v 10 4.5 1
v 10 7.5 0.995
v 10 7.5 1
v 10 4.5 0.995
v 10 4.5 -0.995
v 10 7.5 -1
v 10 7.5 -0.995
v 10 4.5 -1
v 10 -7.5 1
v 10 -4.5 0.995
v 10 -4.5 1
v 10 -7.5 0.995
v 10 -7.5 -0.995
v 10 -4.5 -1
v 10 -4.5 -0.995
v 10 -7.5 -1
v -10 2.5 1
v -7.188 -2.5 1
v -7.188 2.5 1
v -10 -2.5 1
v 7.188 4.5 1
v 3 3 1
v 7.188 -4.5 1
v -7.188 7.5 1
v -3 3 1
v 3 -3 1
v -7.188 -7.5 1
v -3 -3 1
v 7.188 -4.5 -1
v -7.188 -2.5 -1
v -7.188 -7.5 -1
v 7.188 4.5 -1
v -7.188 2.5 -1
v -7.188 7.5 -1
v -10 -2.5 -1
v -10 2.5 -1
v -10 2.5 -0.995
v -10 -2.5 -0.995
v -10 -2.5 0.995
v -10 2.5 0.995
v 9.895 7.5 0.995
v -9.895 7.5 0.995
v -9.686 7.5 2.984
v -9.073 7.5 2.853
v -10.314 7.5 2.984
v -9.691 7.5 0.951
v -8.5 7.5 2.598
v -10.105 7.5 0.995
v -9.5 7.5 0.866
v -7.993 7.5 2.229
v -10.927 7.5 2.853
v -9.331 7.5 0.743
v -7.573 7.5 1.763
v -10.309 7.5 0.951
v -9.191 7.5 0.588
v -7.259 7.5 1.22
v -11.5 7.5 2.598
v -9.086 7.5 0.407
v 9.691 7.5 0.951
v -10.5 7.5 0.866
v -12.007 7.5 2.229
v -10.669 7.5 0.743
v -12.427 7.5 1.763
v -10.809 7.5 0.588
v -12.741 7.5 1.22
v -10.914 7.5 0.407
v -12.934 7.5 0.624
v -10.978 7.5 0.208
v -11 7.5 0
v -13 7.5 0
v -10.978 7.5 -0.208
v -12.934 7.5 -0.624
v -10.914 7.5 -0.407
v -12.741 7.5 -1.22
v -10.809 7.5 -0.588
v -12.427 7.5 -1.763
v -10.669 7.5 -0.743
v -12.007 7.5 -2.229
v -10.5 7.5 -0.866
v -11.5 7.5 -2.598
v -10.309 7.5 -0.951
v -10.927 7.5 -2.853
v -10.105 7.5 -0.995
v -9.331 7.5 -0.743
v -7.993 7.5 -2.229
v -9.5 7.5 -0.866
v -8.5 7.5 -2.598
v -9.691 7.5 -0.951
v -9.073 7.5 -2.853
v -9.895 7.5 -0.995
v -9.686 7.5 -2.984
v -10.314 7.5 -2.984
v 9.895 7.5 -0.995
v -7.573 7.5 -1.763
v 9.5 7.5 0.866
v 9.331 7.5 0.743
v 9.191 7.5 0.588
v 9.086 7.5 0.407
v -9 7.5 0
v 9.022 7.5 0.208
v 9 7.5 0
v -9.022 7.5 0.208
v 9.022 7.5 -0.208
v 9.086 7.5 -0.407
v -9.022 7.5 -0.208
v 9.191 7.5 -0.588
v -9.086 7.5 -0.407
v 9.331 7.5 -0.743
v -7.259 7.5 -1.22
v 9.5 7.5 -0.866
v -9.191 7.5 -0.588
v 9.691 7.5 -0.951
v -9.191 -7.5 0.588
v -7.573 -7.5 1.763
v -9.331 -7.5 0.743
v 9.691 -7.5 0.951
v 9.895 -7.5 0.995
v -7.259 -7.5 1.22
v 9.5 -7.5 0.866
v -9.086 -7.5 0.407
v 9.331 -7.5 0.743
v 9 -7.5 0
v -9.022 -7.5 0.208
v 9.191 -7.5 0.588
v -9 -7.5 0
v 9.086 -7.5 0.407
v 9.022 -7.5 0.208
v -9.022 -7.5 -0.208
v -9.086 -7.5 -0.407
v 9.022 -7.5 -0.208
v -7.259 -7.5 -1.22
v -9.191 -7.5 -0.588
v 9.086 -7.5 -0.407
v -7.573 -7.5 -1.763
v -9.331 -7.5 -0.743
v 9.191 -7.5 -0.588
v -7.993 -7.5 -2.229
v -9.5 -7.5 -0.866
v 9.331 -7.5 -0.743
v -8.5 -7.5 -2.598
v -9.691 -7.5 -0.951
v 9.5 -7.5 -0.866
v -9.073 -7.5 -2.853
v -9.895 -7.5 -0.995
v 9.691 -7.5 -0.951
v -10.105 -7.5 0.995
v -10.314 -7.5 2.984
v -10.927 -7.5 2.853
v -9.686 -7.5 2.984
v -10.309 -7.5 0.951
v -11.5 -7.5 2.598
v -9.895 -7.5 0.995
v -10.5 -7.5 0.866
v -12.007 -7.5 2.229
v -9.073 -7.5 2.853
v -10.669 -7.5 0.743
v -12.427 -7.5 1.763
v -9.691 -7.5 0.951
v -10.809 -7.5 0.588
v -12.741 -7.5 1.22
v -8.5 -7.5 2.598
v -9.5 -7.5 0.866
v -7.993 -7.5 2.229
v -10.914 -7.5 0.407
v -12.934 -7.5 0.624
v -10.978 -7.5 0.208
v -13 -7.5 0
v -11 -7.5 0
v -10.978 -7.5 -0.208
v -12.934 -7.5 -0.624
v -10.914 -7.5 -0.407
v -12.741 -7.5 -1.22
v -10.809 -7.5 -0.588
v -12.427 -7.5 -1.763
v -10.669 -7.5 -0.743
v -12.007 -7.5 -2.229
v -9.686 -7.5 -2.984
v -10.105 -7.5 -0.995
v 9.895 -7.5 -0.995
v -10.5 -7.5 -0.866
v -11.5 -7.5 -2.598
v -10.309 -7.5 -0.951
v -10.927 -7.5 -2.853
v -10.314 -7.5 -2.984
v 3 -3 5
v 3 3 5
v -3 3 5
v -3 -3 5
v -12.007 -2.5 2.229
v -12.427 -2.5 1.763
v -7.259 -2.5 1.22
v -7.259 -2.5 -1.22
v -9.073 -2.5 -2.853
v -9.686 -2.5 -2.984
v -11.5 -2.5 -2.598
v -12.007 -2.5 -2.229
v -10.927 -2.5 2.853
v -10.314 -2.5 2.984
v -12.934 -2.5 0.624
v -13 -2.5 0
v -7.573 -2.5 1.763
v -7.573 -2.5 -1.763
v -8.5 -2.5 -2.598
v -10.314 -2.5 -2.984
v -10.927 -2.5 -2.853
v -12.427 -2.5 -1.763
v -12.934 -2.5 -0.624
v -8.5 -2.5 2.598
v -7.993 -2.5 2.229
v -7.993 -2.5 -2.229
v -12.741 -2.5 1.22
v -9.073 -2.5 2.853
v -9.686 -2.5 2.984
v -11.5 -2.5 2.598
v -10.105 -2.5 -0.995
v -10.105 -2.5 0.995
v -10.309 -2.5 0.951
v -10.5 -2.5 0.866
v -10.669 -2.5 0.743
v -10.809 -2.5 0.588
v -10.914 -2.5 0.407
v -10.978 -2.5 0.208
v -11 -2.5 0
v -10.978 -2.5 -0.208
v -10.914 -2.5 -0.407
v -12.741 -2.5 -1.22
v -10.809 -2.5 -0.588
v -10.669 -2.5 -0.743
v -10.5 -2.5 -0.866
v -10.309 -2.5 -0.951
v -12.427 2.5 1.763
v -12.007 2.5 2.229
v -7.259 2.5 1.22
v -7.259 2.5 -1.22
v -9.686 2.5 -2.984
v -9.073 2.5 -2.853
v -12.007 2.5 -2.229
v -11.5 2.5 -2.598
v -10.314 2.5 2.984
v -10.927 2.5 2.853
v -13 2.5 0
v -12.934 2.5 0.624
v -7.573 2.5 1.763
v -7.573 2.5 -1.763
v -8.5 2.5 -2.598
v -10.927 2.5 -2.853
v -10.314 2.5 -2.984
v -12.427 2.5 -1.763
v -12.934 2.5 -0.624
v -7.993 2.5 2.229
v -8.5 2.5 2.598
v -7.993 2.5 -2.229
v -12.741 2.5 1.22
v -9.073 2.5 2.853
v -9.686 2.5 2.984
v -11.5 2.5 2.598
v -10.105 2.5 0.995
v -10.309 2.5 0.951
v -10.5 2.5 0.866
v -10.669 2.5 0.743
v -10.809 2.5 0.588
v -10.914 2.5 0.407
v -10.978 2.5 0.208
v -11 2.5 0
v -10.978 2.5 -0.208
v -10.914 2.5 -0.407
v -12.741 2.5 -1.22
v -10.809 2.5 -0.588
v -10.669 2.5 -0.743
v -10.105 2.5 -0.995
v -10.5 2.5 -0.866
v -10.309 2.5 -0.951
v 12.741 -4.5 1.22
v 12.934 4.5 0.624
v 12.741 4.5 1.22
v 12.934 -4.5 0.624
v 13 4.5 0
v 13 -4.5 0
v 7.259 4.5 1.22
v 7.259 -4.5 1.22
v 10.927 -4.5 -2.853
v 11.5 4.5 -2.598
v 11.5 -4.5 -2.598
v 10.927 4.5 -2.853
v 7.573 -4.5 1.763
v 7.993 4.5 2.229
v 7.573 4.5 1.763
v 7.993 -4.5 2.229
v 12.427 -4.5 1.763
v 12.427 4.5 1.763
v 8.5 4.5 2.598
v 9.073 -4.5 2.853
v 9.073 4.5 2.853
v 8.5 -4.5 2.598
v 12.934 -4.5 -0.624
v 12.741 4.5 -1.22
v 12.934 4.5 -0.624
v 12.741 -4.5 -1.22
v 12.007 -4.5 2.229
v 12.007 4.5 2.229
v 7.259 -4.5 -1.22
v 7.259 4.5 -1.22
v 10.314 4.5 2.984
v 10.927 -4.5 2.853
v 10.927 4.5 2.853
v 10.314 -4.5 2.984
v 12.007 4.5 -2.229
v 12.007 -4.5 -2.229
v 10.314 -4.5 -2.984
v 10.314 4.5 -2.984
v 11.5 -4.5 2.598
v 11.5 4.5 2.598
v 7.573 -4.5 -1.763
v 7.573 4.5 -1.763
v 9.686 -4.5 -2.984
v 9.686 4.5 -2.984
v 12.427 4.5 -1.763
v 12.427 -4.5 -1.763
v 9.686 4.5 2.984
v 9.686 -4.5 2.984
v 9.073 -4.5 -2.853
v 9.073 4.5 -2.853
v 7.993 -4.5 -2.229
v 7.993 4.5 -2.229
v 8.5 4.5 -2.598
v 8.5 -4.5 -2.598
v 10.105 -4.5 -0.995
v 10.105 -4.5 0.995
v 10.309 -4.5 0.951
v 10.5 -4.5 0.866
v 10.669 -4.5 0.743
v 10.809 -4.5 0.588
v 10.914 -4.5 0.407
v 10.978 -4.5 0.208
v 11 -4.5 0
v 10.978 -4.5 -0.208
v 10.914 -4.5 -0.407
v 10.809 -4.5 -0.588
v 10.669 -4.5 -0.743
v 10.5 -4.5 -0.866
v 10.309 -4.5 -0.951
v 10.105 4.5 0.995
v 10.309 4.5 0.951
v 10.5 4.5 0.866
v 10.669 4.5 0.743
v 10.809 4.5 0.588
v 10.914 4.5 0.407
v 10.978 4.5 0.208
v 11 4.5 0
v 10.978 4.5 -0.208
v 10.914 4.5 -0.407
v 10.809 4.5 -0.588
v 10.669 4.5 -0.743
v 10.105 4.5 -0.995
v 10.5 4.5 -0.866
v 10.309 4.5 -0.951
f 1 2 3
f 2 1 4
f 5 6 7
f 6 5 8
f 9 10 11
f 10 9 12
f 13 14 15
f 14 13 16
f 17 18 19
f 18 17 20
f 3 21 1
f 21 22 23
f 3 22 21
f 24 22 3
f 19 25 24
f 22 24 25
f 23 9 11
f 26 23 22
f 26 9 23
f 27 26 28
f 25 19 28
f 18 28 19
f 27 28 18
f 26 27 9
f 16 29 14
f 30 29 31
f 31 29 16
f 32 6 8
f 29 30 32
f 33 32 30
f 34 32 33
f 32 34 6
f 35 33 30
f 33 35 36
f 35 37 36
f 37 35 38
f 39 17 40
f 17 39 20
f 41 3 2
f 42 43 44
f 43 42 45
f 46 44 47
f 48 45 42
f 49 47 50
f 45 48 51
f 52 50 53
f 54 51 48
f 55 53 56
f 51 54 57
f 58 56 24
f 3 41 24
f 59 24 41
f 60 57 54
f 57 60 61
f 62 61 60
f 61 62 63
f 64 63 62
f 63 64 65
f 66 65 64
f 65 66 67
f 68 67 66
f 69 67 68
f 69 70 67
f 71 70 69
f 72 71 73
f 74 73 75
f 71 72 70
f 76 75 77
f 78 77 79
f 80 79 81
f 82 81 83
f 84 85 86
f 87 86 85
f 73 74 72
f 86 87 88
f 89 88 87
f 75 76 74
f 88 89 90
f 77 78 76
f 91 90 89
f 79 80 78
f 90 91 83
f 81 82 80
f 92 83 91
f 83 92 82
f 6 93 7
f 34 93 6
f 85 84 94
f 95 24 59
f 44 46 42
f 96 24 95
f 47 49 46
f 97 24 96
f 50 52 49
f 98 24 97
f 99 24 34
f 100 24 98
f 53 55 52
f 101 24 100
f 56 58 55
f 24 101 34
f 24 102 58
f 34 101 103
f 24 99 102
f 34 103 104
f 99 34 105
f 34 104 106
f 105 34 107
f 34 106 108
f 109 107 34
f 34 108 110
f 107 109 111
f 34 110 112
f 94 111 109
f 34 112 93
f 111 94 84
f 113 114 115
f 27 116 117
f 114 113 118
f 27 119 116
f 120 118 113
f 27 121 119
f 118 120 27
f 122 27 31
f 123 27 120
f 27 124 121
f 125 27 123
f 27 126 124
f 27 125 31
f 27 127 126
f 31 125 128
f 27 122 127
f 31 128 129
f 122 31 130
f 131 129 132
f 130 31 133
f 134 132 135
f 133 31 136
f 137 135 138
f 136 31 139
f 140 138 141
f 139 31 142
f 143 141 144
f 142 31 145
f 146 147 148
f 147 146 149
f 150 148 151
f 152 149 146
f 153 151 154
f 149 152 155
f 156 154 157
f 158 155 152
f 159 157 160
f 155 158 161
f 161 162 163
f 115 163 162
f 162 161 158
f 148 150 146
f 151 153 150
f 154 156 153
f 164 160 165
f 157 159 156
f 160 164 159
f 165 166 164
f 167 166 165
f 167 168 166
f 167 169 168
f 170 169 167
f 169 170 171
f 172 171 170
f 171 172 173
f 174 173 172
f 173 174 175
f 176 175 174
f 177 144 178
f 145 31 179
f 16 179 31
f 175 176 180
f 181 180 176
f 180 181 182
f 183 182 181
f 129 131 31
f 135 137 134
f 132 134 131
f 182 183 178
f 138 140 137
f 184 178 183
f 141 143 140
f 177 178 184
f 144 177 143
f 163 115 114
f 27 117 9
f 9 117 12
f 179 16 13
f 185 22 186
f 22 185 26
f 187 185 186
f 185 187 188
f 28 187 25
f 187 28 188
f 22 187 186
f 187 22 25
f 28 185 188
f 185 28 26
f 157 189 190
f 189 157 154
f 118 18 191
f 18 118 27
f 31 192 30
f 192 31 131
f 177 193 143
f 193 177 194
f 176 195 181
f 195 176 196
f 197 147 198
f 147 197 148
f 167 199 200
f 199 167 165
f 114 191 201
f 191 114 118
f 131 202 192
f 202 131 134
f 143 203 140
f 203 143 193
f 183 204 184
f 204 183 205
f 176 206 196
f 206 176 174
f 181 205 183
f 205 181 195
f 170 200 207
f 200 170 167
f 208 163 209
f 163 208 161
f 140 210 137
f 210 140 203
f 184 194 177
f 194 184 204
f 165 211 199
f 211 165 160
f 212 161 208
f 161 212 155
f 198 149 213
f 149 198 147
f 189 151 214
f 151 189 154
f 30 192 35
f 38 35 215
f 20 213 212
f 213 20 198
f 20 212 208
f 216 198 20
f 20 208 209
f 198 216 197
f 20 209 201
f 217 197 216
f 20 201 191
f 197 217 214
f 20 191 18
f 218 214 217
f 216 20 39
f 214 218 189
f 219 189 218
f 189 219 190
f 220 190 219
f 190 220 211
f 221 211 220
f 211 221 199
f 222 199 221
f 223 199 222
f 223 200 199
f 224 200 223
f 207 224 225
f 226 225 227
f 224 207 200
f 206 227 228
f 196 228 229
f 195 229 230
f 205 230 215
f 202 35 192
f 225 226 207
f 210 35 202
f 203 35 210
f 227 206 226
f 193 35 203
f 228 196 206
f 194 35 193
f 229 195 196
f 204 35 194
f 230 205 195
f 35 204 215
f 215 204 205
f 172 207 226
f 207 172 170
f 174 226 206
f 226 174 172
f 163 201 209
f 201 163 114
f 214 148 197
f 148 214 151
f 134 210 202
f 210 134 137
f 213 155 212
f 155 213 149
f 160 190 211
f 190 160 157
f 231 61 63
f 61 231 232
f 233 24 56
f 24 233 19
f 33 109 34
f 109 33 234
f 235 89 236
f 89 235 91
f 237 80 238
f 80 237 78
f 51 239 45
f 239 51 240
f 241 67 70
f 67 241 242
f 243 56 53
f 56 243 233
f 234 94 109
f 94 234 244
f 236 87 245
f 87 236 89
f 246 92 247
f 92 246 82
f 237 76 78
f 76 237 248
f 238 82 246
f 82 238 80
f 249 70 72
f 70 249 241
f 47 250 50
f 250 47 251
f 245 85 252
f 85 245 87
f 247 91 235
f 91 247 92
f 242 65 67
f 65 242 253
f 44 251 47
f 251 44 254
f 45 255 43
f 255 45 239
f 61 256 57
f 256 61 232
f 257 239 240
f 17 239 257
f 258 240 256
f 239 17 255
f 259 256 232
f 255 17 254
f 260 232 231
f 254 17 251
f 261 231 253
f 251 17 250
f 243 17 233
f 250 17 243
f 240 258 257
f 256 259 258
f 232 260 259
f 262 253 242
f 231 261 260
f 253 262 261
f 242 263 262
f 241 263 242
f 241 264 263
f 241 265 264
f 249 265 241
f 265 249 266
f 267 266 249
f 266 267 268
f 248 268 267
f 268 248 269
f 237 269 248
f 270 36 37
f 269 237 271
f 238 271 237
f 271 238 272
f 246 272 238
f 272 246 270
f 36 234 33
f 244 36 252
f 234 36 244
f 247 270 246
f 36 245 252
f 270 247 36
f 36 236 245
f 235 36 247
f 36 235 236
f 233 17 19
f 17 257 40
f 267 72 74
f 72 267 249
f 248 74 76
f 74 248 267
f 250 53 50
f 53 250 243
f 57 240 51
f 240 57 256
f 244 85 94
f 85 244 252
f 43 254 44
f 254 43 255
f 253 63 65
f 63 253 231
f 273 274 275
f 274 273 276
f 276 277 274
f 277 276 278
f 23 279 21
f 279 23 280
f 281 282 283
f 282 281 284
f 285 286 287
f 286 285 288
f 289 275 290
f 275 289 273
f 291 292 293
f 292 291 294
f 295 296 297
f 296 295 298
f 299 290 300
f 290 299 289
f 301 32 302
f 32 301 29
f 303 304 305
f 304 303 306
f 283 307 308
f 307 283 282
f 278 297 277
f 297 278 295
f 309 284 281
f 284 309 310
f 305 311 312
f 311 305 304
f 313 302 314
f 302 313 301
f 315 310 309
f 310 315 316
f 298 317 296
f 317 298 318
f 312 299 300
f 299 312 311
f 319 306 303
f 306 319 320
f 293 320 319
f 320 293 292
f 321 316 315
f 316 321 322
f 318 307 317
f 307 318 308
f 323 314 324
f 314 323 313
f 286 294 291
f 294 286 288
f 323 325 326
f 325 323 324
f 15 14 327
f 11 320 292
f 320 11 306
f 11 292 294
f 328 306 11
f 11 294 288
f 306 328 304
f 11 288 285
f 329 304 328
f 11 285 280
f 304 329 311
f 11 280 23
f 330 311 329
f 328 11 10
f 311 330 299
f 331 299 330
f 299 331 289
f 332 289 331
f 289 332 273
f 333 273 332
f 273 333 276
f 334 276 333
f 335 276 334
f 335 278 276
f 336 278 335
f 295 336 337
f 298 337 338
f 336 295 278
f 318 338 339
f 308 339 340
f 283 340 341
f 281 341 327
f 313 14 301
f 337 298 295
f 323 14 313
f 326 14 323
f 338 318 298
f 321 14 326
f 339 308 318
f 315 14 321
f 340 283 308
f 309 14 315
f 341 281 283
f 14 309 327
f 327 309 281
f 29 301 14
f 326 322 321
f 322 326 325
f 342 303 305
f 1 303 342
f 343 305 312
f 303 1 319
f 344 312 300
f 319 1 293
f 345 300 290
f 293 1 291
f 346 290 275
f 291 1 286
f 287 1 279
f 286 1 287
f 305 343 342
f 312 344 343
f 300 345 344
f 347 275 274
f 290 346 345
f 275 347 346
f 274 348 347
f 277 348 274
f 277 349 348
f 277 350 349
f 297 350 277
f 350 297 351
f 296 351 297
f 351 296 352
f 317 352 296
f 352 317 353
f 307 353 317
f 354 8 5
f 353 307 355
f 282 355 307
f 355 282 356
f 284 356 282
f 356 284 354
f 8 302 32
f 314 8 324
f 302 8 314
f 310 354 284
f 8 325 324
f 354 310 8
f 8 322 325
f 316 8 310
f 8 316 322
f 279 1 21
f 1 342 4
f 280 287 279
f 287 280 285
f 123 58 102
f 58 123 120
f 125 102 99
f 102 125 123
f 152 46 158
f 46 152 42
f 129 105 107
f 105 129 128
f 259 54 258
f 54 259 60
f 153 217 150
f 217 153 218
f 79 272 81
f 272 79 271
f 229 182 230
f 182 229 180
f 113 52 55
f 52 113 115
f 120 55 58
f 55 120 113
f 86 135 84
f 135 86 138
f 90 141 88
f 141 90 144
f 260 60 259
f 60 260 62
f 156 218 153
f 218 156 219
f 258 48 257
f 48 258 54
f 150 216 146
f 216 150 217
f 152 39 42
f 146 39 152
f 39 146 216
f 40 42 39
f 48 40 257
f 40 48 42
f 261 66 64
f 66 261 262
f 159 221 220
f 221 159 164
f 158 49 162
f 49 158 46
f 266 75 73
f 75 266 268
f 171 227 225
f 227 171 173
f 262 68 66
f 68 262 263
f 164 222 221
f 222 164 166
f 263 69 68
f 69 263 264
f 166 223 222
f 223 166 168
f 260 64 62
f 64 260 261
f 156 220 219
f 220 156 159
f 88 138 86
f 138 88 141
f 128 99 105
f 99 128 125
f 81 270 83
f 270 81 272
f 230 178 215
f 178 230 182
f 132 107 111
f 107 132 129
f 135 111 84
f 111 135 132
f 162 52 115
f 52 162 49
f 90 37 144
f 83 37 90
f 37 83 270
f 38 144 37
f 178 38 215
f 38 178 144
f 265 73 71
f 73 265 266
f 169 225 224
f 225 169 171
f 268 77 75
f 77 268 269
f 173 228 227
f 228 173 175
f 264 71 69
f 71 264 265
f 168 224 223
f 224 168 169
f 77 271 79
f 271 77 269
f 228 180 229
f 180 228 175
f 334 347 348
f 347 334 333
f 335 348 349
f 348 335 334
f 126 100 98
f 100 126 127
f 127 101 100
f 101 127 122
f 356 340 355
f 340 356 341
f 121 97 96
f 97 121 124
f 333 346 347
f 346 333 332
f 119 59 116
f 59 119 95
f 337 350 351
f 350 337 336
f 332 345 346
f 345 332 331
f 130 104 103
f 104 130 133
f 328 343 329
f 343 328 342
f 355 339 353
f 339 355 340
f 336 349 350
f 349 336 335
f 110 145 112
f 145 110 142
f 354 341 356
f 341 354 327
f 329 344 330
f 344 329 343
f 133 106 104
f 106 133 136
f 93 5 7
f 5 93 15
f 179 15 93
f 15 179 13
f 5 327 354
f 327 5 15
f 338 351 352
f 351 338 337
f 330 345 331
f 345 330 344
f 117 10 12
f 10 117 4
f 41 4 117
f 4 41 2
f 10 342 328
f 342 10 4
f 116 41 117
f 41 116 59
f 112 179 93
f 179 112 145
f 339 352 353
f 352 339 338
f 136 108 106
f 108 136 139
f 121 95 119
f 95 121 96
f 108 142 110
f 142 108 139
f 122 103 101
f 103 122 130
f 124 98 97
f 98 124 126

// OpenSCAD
// Eslabón de la Oruga para Impresión 3D
// Taller de Programación I - Solemne 3

$fn = 30;

eslabon_w = 15.0; // Ancho del eslabón (mismo ancho de rueda)
eslabon_l = 20.0; // Largo de eslabón
eslabon_t = 2.0;  // Grosor de base
pin_r = 1.0;      // Radio del pasador de unión

module eslabon() {
    difference() {
        union() {
            // Base del eslabón
            cube([eslabon_l, eslabon_w, eslabon_t], center=true);
            
            // Diente de tracción central (encastra en la rueda)
            translate([0, 0, eslabon_t/2 + 2])
                cube([6, 6, 4], center=true);
                
            // Bisagra lado A (hembra)
            translate([-eslabon_l/2, -eslabon_w/2 + 2.5, 0])
                rotate([90, 0, 0]) cylinder(r = 3, h = 5, center=true);
            translate([-eslabon_l/2, eslabon_w/2 - 2.5, 0])
                rotate([90, 0, 0]) cylinder(r = 3, h = 5, center=true);
                
            // Bisagra lado B (macho central)
            translate([eslabon_l/2, 0, 0])
                rotate([90, 0, 0]) cylinder(r = 3, h = eslabon_w - 6, center=true);
        }
        
        // Agujero de bisagra lado A (agujero para pasador)
        translate([-eslabon_l/2, 0, 0])
            rotate([90, 0, 0]) cylinder(r = pin_r, h = eslabon_w + 2, center=true);
            
        // Agujero de bisagra lado B
        translate([eslabon_l/2, 0, 0])
            rotate([90, 0, 0]) cylinder(r = pin_r, h = eslabon_w + 2, center=true);
    }
}

eslabon();
